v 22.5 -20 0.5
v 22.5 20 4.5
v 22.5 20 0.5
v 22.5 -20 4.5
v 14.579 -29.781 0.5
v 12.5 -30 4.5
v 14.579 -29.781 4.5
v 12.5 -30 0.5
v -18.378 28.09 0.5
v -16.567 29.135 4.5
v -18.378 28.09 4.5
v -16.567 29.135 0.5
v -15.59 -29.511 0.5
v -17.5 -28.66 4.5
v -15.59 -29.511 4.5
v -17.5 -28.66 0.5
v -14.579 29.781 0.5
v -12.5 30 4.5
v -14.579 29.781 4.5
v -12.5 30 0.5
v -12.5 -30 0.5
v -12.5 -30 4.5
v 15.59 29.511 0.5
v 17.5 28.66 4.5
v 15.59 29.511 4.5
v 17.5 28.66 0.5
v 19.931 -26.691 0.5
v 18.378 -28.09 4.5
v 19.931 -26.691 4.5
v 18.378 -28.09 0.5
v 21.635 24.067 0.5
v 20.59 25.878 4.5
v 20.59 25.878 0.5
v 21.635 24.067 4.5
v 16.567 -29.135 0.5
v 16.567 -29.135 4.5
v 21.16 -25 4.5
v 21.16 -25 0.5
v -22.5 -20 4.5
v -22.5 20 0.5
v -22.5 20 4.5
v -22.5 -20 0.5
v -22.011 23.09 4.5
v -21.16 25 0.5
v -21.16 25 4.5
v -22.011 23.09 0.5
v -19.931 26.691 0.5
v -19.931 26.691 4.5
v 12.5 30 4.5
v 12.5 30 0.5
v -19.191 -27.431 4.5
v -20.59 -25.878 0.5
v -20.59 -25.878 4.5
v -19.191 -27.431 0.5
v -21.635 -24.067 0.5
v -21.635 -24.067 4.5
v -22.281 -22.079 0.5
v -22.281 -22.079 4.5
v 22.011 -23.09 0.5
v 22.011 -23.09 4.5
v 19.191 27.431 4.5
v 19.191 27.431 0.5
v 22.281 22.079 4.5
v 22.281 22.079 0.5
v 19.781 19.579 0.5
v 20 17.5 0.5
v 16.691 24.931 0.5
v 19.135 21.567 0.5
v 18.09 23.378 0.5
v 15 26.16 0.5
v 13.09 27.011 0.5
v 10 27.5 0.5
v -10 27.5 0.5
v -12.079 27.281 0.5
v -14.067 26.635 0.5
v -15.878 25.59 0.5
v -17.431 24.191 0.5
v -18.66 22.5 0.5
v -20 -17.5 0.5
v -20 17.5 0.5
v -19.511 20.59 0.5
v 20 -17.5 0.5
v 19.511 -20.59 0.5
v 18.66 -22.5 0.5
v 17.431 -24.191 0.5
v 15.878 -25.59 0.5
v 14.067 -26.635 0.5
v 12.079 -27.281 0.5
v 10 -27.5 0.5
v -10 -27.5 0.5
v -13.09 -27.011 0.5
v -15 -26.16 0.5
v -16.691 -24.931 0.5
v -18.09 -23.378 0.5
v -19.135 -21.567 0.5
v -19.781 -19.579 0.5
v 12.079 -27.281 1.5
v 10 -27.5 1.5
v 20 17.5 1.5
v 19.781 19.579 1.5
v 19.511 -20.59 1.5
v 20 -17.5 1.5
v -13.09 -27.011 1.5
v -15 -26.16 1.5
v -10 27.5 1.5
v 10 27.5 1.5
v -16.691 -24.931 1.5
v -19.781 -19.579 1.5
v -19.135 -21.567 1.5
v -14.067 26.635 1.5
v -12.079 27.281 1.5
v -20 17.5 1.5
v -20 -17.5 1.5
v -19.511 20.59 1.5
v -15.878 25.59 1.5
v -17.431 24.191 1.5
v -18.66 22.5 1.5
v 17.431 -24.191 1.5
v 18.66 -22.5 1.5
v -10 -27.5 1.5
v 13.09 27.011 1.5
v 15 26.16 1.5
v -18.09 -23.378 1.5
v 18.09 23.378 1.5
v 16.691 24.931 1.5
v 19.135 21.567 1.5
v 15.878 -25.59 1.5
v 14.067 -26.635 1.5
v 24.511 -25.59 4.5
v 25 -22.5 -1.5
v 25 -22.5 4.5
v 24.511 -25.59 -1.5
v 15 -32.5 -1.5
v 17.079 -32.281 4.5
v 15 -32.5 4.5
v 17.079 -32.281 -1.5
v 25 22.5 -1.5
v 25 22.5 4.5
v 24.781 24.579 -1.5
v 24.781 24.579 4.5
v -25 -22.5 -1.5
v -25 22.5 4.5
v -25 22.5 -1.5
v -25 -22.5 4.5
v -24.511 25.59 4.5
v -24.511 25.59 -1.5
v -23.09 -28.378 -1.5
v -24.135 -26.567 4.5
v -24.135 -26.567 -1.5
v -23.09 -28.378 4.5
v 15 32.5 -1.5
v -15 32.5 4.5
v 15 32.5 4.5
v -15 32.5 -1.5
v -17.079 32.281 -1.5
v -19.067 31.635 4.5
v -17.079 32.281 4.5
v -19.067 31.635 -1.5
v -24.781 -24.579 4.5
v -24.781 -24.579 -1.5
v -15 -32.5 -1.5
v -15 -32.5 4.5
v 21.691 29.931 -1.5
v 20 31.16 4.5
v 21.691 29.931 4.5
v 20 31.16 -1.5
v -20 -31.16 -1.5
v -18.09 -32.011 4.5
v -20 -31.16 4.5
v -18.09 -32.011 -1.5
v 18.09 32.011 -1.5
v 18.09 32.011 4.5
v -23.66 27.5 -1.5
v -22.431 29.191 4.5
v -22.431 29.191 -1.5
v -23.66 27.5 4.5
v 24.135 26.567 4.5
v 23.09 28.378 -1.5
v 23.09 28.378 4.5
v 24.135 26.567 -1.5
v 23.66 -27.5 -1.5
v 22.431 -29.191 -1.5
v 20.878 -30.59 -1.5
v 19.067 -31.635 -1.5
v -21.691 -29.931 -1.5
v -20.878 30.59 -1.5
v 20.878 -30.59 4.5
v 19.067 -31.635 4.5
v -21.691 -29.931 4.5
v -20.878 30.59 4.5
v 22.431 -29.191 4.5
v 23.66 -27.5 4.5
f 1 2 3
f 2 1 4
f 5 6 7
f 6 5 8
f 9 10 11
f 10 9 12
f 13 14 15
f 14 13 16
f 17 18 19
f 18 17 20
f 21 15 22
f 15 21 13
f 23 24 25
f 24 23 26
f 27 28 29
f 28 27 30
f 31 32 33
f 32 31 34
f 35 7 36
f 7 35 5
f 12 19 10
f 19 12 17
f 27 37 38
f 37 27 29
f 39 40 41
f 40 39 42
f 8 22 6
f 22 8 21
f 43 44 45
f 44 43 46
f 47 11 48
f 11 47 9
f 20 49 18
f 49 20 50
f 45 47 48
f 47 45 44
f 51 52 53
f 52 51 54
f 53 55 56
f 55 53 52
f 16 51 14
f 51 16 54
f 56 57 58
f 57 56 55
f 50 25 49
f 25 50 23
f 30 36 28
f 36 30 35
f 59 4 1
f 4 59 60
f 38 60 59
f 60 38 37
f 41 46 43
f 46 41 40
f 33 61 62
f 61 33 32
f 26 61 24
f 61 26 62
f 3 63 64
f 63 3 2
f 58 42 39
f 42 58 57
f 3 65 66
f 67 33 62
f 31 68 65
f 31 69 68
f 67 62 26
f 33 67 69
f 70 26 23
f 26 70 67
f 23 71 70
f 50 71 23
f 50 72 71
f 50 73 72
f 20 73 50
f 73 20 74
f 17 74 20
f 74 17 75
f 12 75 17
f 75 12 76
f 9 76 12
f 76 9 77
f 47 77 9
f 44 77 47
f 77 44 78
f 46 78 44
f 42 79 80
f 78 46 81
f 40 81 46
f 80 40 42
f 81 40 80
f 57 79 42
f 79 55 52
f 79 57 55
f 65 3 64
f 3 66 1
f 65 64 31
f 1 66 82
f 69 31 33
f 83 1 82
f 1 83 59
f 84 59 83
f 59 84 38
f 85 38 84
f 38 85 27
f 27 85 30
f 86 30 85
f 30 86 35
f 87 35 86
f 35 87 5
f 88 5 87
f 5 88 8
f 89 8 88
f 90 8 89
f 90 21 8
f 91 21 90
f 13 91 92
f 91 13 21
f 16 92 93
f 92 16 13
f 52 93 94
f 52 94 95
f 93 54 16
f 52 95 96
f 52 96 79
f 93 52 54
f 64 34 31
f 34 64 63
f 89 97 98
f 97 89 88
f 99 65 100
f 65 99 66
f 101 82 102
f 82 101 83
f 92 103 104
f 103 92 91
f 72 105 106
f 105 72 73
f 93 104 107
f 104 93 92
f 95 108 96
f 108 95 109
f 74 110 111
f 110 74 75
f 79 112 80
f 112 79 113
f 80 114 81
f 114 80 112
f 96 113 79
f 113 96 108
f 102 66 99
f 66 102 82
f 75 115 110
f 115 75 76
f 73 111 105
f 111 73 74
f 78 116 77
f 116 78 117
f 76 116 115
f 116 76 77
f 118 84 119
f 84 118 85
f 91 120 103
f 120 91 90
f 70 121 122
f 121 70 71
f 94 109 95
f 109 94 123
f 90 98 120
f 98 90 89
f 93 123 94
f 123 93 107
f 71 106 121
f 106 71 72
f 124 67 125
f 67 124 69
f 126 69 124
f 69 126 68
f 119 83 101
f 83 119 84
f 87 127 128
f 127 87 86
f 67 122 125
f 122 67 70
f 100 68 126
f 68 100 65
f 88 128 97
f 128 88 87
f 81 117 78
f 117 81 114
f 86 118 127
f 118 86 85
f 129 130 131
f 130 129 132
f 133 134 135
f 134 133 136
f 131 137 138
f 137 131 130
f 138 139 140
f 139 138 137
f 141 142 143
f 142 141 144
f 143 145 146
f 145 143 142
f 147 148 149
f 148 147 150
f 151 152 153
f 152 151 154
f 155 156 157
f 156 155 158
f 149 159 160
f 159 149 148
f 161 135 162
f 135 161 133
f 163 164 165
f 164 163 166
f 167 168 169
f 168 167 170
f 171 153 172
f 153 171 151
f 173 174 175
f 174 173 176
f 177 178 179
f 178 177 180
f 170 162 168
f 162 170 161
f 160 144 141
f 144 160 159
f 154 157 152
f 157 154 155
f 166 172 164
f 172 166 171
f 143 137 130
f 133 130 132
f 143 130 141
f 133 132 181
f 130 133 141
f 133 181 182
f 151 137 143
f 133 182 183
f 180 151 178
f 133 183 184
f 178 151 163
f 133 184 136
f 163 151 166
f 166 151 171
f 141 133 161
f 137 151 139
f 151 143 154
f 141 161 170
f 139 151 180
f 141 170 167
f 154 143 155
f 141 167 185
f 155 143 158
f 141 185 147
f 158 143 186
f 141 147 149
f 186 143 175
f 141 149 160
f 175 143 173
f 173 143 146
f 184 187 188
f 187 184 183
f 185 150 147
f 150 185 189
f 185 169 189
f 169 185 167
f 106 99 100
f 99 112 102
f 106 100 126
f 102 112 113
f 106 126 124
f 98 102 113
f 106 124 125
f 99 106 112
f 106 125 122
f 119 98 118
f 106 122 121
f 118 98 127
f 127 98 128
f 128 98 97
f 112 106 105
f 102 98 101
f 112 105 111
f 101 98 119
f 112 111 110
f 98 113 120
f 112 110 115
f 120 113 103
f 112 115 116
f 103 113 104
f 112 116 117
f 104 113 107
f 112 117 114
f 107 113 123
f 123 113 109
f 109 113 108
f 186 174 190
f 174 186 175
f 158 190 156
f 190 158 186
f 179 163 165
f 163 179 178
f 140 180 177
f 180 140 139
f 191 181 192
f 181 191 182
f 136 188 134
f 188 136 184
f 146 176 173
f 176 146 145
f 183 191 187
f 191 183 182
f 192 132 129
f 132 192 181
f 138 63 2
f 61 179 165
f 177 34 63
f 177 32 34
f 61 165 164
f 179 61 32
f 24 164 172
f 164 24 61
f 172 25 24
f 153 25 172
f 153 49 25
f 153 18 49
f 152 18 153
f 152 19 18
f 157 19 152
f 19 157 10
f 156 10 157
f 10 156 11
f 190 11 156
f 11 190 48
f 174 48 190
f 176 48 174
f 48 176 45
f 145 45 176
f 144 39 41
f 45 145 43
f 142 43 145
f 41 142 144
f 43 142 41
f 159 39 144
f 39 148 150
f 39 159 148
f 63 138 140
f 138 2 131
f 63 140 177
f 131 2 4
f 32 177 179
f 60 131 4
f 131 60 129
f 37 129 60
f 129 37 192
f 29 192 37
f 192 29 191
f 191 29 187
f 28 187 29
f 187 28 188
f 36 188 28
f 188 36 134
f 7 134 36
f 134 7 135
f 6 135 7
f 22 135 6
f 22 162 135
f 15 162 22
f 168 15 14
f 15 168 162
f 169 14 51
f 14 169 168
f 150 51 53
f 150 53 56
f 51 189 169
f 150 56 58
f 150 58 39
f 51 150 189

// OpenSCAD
/*
 * Test for a stamp mold
 */
echo(version=version());

// Base plate
// ----------
plateWidth = 50;    // 50
plateLength = 65;   // 50
plateThickNess = 3;
cornerRadius = 10;

logo = "./images/go.away.v2.small.png"; 
imgRatio = 1.1;
logox = 430 * imgRatio; 
logoy = 500 * imgRatio; 

module roundedRect(size, radius) {  
	linear_extrude(height=size.z, center=true) {
		offset(radius) offset(-radius) {
			square([size.x, size.y], center = true);
		}
	}
}

difference() {  
	union() {
		difference() {
			roundedRect([plateWidth, plateLength, plateThickNess], cornerRadius);
			translate([0, 0, 2]) {
				scale([.9 * plateWidth / logox, .9 * plateWidth / logoy, .02]) {
					color("red") {
						rotate([0, 0, -90]) {
							surface(file=logo, invert=true, center=true);
						}
					}
				}
        // the groove around the picture
        difference() {
          roundedRect([plateWidth -  5, plateLength -  5, plateThickNess], cornerRadius);
          roundedRect([plateWidth - 10, plateLength - 10, plateThickNess * 1.1], cornerRadius);
        }
			}
		}
		// The frame
		translate([0, 0, (plateThickNess / 1)]) {
			difference() {
				roundedRect([plateWidth, plateLength, plateThickNess], cornerRadius);
				roundedRect([plateWidth - 5, plateLength - 5, plateThickNess * 1.1], cornerRadius);
			}
		}
	}
}
